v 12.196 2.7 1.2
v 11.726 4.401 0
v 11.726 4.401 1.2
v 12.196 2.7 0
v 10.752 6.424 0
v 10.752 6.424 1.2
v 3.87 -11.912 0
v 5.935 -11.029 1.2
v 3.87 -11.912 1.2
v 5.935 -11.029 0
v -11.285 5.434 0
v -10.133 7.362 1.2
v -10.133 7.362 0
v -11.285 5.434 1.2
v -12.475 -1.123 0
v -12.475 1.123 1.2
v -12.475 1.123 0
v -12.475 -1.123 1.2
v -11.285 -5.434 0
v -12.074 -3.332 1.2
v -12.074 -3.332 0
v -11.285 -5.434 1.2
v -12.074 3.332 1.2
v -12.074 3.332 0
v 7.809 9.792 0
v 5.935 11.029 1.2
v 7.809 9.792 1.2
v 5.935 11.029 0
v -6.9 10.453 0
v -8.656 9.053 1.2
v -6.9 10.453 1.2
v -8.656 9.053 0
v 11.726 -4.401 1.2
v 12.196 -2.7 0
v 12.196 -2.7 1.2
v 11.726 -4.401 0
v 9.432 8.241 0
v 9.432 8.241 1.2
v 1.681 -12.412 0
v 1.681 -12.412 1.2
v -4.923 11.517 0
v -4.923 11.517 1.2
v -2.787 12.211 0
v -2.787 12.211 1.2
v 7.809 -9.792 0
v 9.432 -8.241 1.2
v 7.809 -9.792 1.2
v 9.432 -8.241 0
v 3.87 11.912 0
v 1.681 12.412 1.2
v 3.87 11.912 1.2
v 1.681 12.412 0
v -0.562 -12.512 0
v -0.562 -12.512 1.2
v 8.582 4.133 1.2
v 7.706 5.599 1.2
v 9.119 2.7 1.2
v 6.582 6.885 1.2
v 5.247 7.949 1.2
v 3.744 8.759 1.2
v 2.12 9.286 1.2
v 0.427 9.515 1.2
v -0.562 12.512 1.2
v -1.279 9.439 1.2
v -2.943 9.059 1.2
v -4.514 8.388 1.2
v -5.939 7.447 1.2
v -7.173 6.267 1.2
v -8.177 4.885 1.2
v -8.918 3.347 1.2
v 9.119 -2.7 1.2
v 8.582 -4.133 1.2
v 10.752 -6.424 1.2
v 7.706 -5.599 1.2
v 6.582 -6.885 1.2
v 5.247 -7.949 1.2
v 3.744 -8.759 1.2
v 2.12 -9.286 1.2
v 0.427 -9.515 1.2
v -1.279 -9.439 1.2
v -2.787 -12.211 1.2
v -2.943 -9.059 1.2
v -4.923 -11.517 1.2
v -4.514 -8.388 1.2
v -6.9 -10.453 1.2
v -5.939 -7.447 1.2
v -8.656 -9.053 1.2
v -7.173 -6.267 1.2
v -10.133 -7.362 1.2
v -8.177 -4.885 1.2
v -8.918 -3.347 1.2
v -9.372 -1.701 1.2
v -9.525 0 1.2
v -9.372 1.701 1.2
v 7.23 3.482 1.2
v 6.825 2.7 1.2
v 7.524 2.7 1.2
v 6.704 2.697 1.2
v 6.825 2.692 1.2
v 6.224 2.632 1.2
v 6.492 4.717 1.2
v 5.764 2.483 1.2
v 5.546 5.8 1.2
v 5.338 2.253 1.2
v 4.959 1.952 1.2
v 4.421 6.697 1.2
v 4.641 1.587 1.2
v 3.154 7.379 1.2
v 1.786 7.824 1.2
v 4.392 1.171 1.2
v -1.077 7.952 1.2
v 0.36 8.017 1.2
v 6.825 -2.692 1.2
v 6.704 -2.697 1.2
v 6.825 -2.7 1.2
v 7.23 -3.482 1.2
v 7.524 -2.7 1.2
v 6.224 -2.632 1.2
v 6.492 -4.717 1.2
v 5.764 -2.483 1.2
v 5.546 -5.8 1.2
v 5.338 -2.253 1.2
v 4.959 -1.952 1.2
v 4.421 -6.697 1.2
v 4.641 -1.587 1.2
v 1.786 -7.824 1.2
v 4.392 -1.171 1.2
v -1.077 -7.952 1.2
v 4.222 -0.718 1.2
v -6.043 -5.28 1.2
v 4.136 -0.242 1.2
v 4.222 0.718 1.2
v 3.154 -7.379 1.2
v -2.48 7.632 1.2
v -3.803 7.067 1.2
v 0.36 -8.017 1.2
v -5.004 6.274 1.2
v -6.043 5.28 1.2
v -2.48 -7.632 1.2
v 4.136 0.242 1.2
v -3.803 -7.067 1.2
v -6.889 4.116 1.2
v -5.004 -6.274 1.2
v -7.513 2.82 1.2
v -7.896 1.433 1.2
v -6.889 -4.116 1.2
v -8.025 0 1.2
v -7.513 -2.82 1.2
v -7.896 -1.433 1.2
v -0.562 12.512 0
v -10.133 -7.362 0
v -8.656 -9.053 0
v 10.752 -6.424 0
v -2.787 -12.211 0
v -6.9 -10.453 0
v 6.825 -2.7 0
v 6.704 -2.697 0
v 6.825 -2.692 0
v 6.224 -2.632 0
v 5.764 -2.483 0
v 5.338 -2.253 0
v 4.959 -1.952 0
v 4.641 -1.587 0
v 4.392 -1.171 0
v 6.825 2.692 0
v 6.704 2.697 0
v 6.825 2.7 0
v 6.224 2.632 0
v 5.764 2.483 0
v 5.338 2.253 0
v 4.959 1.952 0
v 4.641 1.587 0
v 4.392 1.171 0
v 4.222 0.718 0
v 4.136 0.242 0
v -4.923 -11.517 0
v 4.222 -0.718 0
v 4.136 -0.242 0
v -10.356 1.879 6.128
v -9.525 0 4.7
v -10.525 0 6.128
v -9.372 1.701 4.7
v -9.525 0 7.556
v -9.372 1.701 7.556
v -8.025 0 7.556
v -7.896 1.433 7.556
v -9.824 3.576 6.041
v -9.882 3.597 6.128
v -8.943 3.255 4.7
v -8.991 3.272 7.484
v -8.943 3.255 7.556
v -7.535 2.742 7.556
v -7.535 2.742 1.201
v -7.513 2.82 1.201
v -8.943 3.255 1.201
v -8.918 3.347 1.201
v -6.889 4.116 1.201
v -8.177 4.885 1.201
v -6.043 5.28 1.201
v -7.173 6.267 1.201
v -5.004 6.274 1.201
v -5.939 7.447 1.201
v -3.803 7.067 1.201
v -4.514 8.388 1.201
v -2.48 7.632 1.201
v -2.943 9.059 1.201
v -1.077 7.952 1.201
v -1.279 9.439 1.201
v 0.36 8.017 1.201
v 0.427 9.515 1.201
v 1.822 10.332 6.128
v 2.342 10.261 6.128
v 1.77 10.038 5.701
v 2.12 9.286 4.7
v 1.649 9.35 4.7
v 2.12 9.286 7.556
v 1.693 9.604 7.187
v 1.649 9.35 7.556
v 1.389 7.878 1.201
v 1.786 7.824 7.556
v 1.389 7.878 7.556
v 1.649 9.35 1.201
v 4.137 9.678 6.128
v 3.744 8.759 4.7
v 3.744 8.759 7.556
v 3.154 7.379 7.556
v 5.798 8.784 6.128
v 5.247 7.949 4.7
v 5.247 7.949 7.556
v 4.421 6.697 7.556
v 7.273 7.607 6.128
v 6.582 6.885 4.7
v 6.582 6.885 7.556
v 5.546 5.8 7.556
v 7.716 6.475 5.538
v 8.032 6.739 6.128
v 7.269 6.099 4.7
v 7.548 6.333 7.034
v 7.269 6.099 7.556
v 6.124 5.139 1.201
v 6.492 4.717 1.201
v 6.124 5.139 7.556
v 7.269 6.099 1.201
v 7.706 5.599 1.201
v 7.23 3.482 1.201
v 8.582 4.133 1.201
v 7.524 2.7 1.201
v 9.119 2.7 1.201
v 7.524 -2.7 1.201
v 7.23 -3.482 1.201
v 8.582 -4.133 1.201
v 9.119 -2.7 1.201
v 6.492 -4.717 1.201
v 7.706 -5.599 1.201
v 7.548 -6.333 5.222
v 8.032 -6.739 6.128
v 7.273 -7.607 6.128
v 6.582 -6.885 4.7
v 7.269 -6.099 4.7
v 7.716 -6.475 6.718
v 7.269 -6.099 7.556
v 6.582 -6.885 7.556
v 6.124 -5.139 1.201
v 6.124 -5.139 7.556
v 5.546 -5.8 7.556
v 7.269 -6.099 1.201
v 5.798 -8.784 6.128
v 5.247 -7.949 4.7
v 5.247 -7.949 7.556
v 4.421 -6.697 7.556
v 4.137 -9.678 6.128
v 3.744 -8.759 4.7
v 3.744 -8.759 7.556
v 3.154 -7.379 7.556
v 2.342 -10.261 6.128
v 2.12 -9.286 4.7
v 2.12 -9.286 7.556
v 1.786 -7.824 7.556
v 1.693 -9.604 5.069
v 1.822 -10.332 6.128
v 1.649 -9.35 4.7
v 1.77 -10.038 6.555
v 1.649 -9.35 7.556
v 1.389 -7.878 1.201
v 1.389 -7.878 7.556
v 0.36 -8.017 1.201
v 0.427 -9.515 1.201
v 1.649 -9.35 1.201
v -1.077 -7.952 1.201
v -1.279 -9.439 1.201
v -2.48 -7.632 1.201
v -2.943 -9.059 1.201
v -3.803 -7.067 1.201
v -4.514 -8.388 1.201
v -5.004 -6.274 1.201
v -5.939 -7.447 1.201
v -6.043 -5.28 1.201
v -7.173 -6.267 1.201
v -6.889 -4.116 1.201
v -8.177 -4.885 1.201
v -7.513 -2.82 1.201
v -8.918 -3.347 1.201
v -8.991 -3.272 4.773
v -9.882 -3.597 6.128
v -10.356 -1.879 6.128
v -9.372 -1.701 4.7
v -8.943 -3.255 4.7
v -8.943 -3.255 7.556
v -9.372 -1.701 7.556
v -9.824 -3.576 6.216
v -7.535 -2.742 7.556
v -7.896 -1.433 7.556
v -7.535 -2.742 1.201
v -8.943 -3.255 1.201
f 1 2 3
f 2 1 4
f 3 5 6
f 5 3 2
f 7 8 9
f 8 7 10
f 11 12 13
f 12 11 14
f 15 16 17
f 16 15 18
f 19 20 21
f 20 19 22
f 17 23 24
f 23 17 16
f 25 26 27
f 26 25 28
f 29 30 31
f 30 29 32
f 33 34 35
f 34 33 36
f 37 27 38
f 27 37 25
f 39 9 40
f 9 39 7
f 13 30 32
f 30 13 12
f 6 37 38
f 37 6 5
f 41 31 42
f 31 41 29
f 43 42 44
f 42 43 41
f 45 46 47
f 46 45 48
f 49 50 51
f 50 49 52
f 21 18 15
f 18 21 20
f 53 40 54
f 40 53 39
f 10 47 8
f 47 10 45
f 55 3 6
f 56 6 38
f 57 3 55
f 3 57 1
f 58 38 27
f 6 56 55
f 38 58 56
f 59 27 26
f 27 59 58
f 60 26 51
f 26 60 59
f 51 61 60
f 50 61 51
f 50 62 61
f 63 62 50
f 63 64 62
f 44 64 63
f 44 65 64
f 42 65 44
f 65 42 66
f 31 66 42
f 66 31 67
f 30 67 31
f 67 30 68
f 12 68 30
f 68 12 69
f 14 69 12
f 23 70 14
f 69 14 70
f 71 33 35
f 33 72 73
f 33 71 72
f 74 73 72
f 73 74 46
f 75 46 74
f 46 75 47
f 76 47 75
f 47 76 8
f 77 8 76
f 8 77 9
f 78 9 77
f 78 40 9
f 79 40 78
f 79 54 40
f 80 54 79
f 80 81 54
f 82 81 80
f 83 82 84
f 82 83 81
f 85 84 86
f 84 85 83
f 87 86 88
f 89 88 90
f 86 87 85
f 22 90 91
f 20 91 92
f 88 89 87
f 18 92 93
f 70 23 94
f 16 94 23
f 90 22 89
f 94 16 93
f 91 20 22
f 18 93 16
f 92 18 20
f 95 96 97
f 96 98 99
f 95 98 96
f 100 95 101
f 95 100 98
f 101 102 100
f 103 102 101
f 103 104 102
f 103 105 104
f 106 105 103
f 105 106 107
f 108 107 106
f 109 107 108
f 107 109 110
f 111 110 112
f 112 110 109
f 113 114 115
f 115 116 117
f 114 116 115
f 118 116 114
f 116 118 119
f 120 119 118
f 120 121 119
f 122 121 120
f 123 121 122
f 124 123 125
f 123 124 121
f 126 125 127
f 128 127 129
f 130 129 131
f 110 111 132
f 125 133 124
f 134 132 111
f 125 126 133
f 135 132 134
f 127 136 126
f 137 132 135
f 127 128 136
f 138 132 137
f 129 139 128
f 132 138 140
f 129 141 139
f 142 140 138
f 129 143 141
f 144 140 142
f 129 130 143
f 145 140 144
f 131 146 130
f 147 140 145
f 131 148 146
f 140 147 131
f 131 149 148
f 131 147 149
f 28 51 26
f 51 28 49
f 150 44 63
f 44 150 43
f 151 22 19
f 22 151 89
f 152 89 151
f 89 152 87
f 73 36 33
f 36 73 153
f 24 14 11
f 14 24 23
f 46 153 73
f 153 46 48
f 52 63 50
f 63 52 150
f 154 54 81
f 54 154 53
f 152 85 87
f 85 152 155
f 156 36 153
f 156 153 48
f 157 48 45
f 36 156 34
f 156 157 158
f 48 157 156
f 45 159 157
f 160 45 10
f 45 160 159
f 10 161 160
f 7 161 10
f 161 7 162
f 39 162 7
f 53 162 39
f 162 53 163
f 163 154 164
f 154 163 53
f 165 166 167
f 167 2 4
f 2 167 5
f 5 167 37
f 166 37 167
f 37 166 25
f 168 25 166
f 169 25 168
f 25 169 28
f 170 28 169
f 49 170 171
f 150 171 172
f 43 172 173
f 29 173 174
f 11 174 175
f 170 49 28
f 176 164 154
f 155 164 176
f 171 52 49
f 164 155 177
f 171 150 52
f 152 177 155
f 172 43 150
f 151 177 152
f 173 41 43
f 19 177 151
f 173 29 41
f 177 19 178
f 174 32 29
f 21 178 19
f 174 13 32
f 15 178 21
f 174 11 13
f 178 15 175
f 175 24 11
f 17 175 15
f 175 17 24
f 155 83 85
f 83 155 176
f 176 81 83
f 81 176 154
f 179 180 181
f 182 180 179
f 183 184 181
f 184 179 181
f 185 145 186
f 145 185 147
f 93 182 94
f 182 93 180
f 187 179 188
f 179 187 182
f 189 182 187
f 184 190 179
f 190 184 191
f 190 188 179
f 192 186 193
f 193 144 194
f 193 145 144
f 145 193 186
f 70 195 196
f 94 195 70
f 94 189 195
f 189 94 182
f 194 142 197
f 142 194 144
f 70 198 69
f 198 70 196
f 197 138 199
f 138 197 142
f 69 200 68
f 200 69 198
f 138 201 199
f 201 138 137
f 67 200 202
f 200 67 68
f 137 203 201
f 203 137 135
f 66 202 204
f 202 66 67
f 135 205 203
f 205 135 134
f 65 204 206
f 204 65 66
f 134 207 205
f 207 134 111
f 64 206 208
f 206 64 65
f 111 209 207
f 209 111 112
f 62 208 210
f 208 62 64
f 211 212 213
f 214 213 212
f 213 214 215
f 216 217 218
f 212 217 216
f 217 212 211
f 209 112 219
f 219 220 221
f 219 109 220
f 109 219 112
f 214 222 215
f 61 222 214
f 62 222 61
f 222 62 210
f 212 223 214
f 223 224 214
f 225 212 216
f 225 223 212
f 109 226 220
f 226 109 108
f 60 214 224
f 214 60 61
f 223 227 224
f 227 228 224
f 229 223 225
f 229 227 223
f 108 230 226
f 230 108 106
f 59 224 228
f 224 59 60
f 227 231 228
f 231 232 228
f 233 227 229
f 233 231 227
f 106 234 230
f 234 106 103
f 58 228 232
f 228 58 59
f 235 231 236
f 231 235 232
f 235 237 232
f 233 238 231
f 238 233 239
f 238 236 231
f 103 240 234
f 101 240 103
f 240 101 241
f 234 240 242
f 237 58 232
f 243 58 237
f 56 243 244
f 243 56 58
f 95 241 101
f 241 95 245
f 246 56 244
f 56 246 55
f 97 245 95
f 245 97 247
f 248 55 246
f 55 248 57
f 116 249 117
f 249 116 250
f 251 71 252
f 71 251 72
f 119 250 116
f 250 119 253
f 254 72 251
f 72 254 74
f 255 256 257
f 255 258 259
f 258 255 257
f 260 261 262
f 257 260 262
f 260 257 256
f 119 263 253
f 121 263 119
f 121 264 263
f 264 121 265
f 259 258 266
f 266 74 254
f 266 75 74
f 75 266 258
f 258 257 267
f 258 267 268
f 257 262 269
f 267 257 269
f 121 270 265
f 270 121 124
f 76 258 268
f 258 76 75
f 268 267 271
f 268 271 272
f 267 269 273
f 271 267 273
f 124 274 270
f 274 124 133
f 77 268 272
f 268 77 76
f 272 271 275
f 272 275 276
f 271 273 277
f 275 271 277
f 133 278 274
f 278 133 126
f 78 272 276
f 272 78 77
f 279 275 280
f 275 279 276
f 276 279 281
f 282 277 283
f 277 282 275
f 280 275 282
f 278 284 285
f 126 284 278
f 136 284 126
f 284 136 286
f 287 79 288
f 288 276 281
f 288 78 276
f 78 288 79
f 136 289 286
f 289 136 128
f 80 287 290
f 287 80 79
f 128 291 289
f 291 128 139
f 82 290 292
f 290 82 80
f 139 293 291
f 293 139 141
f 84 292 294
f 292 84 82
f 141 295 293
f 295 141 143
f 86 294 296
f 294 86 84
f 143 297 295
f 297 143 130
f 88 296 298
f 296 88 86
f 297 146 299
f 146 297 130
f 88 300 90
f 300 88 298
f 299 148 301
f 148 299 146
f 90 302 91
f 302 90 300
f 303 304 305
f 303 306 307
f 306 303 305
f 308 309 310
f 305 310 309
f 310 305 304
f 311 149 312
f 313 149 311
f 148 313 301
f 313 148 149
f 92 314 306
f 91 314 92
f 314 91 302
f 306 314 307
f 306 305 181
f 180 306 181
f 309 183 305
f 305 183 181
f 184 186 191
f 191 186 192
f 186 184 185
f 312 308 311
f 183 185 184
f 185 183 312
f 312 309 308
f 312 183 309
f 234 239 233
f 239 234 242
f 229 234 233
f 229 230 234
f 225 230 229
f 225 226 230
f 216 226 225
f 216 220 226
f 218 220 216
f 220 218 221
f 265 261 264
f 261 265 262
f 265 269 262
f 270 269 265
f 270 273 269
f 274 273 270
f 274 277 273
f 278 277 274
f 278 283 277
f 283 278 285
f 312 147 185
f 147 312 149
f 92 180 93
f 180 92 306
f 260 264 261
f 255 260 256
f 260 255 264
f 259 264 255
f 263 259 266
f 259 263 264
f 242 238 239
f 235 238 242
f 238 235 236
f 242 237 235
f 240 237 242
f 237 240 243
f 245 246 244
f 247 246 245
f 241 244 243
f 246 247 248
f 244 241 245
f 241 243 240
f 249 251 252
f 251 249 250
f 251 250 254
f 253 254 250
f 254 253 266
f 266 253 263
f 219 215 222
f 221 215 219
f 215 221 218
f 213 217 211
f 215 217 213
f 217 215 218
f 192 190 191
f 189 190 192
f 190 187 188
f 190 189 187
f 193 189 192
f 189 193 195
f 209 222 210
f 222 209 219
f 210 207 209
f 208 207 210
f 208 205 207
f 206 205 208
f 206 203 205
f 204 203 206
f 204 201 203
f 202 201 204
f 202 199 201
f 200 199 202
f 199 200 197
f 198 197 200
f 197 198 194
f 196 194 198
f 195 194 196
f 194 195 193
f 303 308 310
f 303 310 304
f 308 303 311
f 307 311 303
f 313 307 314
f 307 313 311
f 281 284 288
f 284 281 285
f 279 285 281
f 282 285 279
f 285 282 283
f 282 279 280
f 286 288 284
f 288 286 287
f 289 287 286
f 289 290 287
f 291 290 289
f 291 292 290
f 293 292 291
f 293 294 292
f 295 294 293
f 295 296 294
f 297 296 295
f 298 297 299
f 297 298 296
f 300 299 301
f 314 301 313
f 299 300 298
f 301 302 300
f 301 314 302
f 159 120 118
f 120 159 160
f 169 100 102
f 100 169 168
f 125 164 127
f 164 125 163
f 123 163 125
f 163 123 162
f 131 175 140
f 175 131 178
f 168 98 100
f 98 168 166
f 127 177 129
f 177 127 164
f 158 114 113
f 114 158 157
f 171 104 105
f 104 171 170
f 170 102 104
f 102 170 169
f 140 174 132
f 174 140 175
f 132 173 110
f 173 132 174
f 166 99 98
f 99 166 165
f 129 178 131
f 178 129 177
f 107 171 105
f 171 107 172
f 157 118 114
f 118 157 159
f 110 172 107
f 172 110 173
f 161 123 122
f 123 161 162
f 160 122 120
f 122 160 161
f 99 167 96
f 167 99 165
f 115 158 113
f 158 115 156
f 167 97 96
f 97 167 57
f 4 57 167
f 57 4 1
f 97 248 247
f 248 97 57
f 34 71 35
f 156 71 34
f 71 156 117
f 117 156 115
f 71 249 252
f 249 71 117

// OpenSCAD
/*
 * Cable Plug (Parametric), v0.42
 *
 * by Alex Franke (CodeCreations), Dec 2012
 * http://www.theFrankes.com
 * 
 * Licenced under Creative Commons Attribution - Non-Commercial - Share Alike 3.0 
 * 
 * DESCRIPTION: Covers a larger hole in an enclosure while still providing space for a 
 *   cable to fit. This is useful when you need to drill a larger hole in order to fit 
 *   the cable ends through the enclosure wall but want to limit the overall size of the 
 *   opening.  
 * 
 * INSTRUCTIONS:  Choose some values in the "User-defined values" section, render,
 *   and print. Change the numberOfCatches and sliceAngle together to control the size 
 *   of the catches. See the comments for more details. 
 * 
 * v0.42, Dec 20, 2012: Initial Release.
 * 
 * TODO: 
 *   * None at this time. 
 */

/////////////////////////////////////////////////////////////////////////////
// User-defined values... 
/////////////////////////////////////////////////////////////////////////////

caseHoleDiameter    = 19.05;     // Diameter of the hole to plug
cableHoleDiameter   = 5.4;       // Diameter of the cable(s) taht go through the plug

caseThickness       = 3.5;       // Thickness of the material being plugged
caseOverlap         = 3;         // Distance the plug will overlap the hole opening

thickness           = 1.2;       // Thickness of the flat round portion of the plug

catchPostThickness  = 1.5;       // Thickness of the plug posts that go through the hole
catchHeight         = 1;         // Height of the "catch" portion that holds the plug in place
catchAngle          = 55;        // Angle of the "catch" material that holes the plug in place 

numberOfCatches     = 3;         // Number of catches/posts
sliceAngle          = 80;        // The angle of the empty space between catches/posts

$fn                 = 35;        // General curve quality


/////////////////////////////////////////////////////////////////////////////
// The code...
/////////////////////////////////////////////////////////////////////////////

catchYOffset = catchHeight/tan(90-catchAngle); 
stemHeight = caseThickness+catchYOffset*2;

difference() {
	union () {
		cylinder(h=thickness, r=caseHoleDiameter/2+caseOverlap);
	
		translate([0,0,thickness]) 
		rotate_extrude(convexity=5) 
		translate([caseHoleDiameter/2,0,0]) 
		polygon( points=[	
			[-catchPostThickness,0],
			[-catchPostThickness,stemHeight],
			[0,stemHeight],
			[catchHeight,stemHeight-catchYOffset],
			[0,caseThickness],
			[0,0]
			] ); 
	}

	// Cable hole 
	translate([(caseHoleDiameter-cableHoleDiameter)/2,0,-0.5]) 
		cylinder(h=thickness+stemHeight+1, r=cableHoleDiameter/2);

	// Cable channel
	translate([(caseHoleDiameter-cableHoleDiameter)/2,-cableHoleDiameter/2,-0.5]) 
		cube([cableHoleDiameter/2+caseOverlap+1,cableHoleDiameter,thickness+stemHeight+1]);

	// Cut catch posts 
	translate([0,0,thickness+0.001]) 
	for( i=[0:numberOfCatches-1] )
		rotate([0,0,i*(360/numberOfCatches)]) 
			wedge(caseHoleDiameter/2+catchHeight+1,stemHeight+1, sliceAngle);
	
}

module wedge(length, height, angle) {

	x = length; 
	y = 2*x*tan(angle/2); 
	z = height;
	x2 = (y/2)/sin(angle/2);

	difference() {
		translate([0,-y/2,0]) 
			cube([x,y,z]);

		for(i=[-1,1])
			rotate([0,0,angle/2*i]) 
				translate([0,-y/2 +y/2*i,-0.5]) 
					cube([x2,y,z+1]);

	}
}
